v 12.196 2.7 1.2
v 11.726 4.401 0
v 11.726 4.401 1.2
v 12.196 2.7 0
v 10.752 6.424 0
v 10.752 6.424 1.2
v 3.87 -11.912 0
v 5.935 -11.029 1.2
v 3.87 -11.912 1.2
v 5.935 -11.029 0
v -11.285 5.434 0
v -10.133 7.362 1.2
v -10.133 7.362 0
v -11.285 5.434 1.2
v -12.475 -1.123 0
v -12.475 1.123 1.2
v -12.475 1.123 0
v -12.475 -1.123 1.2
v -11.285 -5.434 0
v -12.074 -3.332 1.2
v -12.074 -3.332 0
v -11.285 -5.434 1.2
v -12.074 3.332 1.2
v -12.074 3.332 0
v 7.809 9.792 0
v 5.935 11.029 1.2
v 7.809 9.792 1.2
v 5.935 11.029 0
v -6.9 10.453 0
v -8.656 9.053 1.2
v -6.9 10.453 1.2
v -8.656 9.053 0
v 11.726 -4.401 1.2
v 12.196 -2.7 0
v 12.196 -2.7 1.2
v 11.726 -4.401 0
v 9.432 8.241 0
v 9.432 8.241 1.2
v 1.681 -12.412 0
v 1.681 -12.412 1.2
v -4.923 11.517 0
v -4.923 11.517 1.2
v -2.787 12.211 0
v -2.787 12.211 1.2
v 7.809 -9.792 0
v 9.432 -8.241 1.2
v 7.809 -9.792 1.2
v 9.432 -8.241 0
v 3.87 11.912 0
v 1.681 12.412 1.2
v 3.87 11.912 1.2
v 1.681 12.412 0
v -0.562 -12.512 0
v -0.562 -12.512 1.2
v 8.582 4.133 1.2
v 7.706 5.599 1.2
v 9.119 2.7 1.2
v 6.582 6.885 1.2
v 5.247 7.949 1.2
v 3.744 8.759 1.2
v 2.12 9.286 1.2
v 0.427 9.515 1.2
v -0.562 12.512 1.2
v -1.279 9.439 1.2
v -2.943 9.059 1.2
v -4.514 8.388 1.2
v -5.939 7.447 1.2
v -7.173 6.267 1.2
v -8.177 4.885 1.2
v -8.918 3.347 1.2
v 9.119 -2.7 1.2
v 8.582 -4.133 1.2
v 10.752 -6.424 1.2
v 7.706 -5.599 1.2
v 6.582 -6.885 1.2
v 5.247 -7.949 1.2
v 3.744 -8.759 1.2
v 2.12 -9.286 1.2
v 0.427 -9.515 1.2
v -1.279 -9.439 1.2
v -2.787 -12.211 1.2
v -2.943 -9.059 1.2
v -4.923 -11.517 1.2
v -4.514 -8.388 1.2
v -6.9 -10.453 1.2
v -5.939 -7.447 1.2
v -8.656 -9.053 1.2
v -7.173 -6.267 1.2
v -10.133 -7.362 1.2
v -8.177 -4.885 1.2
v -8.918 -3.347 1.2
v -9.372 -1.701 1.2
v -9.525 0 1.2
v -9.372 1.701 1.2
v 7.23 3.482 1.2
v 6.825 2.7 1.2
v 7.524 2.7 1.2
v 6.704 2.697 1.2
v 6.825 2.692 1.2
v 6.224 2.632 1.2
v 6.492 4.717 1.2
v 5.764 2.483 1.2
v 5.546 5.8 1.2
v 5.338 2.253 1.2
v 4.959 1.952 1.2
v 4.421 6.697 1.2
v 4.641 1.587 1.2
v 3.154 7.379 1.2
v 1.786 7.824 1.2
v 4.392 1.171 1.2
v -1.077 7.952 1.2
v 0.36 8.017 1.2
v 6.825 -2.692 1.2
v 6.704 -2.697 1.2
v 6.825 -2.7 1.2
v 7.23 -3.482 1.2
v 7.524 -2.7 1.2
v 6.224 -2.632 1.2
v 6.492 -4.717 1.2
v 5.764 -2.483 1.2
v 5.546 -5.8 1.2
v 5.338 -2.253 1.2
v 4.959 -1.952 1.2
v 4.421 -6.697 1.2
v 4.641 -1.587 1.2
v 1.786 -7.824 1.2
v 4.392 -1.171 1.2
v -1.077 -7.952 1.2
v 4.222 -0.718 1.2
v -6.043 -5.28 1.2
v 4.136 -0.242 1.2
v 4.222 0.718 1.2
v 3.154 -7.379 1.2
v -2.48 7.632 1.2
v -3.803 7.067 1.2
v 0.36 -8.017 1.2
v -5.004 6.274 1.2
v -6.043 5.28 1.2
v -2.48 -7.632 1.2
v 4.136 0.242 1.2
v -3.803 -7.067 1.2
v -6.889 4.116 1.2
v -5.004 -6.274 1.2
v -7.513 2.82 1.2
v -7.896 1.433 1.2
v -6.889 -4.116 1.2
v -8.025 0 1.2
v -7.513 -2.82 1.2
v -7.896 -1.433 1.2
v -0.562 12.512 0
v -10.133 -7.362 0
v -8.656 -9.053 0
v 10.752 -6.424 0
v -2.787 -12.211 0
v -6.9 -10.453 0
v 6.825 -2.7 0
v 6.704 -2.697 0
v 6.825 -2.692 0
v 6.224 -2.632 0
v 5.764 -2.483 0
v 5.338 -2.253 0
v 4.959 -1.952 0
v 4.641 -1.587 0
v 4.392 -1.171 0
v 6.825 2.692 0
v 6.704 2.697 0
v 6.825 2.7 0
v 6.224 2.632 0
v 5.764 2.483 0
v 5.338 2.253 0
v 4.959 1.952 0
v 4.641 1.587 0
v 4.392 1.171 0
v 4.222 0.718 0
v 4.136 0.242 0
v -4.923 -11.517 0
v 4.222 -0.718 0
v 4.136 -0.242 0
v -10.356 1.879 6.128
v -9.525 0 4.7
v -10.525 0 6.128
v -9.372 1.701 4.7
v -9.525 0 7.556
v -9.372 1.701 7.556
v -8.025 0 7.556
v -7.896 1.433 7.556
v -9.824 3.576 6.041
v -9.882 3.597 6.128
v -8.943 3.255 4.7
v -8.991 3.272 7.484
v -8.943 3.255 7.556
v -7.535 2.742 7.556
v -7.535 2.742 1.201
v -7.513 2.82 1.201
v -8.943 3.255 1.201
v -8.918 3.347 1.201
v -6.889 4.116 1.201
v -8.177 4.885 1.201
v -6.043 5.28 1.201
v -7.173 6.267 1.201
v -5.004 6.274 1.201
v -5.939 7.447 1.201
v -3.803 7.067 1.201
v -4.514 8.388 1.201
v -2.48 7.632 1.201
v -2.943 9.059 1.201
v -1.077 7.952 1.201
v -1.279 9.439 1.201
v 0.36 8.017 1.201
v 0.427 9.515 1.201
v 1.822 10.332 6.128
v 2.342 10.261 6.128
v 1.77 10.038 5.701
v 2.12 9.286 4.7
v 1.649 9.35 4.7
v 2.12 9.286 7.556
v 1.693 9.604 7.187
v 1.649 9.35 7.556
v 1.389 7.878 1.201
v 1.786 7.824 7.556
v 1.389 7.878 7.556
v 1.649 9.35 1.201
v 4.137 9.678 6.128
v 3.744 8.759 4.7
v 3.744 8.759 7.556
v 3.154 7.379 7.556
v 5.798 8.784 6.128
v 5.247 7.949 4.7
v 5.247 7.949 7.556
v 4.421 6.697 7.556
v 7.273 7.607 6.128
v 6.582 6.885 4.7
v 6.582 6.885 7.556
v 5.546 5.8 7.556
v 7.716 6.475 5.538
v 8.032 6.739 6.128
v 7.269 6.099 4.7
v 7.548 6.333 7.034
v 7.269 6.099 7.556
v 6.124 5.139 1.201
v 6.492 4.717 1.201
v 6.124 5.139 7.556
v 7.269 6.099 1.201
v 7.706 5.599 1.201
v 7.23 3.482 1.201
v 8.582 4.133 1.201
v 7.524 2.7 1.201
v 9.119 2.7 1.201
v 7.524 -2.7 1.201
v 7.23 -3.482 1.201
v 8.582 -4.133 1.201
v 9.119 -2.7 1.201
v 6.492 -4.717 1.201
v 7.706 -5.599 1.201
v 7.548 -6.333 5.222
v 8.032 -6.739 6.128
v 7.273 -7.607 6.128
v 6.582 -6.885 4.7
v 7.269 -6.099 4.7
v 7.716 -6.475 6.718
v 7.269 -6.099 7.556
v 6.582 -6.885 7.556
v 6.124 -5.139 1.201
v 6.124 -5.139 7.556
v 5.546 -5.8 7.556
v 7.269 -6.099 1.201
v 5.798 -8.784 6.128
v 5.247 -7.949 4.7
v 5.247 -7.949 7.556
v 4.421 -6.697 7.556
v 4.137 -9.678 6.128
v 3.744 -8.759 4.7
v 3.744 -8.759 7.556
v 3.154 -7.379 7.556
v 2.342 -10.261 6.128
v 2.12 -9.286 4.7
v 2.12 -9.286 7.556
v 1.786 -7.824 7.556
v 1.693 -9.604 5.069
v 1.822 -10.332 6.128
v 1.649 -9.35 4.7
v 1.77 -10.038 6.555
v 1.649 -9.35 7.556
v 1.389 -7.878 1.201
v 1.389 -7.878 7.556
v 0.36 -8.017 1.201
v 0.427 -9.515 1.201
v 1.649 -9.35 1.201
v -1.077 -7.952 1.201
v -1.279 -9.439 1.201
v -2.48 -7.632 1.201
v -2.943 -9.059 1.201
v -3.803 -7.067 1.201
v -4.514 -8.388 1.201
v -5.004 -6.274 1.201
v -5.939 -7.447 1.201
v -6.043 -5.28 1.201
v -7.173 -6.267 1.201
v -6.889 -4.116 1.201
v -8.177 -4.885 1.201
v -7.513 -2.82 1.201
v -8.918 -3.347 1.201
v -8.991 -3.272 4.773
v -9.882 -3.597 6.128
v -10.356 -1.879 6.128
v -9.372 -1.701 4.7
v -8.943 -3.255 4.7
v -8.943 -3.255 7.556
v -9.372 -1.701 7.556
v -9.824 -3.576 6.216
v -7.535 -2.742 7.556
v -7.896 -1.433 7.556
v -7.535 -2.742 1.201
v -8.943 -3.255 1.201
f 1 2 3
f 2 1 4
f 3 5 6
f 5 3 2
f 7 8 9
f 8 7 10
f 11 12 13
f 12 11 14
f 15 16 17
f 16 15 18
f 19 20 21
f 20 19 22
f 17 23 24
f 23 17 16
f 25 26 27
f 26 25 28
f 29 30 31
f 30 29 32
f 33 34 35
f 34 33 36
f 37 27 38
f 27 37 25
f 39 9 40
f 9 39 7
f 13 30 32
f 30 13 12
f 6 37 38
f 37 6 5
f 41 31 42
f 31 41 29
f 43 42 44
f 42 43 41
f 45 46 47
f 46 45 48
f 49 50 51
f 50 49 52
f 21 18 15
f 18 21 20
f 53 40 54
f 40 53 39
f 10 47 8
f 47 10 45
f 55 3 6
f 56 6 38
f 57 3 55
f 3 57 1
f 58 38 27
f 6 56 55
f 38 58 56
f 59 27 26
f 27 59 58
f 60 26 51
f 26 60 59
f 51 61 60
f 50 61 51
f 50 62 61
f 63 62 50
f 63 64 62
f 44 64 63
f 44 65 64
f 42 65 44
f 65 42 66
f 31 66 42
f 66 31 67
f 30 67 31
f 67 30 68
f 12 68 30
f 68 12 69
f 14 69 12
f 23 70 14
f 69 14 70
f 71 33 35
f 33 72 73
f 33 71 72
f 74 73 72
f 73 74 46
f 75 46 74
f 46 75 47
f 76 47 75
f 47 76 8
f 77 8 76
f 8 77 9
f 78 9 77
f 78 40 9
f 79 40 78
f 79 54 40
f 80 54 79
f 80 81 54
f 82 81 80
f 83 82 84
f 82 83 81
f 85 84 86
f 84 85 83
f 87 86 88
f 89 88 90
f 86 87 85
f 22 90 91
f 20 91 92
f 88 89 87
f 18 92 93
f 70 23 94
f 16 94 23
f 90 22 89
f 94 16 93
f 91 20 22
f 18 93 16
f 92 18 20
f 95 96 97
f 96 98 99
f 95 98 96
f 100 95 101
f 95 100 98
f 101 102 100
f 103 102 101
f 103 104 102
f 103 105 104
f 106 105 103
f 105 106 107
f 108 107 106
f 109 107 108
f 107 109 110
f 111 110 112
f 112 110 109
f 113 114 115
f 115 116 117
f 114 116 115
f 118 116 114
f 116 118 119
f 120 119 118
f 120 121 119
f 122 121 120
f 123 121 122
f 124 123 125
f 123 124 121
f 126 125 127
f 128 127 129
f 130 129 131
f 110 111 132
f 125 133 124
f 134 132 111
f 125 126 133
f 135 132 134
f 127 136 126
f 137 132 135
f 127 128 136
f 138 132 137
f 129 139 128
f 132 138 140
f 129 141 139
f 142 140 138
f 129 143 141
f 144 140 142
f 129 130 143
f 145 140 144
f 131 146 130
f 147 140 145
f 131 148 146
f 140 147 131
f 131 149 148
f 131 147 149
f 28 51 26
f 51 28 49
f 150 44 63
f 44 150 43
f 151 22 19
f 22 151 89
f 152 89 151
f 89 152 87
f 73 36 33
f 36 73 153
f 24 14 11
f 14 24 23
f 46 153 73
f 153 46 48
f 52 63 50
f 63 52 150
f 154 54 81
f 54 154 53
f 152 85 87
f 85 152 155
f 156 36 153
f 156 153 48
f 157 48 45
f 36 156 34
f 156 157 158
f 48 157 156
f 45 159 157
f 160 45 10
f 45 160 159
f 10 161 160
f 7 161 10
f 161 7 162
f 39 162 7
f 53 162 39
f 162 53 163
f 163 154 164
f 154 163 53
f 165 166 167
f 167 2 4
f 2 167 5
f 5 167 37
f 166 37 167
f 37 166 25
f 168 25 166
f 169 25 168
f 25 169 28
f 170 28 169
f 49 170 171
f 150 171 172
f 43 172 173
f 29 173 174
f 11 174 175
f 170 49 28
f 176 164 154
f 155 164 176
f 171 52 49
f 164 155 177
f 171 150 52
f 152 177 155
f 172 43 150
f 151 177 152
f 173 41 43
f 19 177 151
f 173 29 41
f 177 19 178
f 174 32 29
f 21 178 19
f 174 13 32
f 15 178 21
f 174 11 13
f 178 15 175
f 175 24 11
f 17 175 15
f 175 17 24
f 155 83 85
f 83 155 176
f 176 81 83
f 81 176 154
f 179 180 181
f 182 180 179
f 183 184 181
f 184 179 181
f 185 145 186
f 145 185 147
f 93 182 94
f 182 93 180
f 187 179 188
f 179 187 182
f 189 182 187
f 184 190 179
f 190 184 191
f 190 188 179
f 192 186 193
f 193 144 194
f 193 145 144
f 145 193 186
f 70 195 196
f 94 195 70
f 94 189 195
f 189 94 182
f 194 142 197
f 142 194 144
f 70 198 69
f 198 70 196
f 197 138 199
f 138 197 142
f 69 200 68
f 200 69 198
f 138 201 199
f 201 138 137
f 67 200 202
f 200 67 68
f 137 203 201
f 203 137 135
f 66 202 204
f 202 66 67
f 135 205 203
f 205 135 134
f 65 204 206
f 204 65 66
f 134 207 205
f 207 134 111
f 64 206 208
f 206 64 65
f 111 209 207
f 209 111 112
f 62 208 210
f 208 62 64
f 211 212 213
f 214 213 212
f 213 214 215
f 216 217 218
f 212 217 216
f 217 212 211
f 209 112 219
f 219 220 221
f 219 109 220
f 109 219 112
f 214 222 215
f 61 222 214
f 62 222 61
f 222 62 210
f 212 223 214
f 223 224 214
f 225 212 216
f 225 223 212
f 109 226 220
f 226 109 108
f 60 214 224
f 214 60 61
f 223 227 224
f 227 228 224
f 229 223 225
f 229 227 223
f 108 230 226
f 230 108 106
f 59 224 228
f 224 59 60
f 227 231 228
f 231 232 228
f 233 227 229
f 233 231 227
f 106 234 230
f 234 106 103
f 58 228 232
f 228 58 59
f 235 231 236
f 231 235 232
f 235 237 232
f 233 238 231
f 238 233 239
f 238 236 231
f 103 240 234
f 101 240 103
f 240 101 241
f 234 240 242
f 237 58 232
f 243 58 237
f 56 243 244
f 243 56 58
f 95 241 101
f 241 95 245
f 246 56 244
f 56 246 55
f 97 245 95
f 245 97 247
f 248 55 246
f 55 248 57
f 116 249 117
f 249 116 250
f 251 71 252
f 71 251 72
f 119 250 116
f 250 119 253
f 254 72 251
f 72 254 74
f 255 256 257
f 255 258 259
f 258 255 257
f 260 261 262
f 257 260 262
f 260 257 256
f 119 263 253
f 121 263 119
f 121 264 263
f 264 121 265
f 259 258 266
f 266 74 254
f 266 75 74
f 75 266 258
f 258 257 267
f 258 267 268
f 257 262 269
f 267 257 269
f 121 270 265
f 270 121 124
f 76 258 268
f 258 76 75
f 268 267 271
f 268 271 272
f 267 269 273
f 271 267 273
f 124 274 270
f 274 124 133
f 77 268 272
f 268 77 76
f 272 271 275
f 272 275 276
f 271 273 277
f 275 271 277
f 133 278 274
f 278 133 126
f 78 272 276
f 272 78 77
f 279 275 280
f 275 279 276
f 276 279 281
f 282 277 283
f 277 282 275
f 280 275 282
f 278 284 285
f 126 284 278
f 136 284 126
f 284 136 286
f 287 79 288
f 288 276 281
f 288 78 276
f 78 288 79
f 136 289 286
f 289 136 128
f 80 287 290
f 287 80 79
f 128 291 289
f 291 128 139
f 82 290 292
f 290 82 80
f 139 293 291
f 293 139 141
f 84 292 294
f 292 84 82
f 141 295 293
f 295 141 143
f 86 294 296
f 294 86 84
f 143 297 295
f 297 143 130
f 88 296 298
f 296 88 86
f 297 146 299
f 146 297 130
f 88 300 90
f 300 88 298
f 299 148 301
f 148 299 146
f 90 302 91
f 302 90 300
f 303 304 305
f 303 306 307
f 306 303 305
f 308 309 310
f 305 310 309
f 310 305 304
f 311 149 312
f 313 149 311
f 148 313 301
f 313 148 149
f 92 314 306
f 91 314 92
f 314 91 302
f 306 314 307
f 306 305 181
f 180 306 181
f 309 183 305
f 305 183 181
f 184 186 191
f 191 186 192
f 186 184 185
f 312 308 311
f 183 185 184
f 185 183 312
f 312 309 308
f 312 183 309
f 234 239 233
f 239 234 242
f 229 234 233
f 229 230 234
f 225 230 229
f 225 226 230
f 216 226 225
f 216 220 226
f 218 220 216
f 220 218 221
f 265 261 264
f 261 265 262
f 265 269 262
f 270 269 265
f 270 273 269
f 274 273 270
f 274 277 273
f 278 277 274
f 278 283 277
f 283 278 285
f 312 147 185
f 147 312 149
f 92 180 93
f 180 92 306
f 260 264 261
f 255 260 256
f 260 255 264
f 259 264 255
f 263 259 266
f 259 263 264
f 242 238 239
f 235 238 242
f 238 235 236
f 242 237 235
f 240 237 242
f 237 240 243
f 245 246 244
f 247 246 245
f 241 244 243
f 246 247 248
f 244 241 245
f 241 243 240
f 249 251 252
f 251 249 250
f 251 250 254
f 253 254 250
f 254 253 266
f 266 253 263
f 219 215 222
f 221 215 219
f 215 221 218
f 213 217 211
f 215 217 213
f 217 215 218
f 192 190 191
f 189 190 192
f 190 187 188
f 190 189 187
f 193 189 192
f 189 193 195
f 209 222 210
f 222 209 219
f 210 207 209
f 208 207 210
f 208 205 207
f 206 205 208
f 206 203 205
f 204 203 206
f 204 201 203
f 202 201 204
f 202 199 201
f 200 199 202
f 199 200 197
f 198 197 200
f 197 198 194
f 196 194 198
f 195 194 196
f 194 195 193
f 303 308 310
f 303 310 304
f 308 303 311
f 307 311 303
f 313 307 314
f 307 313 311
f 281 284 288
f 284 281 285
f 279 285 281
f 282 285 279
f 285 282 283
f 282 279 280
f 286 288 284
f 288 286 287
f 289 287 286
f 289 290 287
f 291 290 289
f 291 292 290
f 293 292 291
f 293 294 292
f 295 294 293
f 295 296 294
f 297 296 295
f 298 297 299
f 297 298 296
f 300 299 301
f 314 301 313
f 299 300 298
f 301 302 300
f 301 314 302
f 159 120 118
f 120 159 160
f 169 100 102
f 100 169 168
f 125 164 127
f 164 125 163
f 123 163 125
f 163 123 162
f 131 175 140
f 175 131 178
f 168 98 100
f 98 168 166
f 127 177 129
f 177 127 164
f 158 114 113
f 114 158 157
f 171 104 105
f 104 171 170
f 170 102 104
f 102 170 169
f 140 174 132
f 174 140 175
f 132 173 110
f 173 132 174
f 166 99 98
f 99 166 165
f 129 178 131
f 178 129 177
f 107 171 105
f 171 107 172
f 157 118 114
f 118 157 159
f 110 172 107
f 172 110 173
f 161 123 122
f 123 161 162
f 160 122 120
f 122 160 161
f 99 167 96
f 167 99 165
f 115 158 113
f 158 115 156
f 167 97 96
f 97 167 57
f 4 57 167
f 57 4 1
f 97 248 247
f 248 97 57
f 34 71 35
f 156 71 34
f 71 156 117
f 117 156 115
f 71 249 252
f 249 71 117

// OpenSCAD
/*
 * Cable Plug (Parametric), v0.42
 *
 * by Alex Franke (CodeCreations), Dec 2012
 * http://www.theFrankes.com
 * 
 * Licenced under Creative Commons Attribution - Non-Commercial - Share Alike 3.0 
 * 
 * DESCRIPTION: Covers a larger hole in an enclosure while still providing space for a 
 *   cable to fit. This is useful when you need to drill a larger hole in order to fit 
 *   the cable ends through the enclosure wall but want to limit the overall size of the 
 *   opening.  
 * 
 * INSTRUCTIONS:  Choose some values in the "User-defined values" section, render,
 *   and print. Change the numberOfCatches and sliceAngle together to control the size 
 *   of the catches. See the comments for more details. 
 * 
 * v0.42, Dec 20, 2012: Initial Release.
 * 
 * TODO: 
 *   * None at this time. 
 */

/////////////////////////////////////////////////////////////////////////////
// User-defined values... 
/////////////////////////////////////////////////////////////////////////////

caseHoleDiameter    = 19.05;     // Diameter of the hole to plug
cableHoleDiameter   = 5.4;       // Diameter of the cable(s) taht go through the plug

caseThickness       = 3.5;       // Thickness of the material being plugged
caseOverlap         = 3;         // Distance the plug will overlap the hole opening

thickness           = 1.2;       // Thickness of the flat round portion of the plug

catchPostThickness  = 1.5;       // Thickness of the plug posts that go through the hole
catchHeight         = 1;         // Height of the "catch" portion that holds the plug in place
catchAngle          = 55;        // Angle of the "catch" material that holes the plug in place 

numberOfCatches     = 3;         // Number of catches/posts
sliceAngle          = 80;        // The angle of the empty space between catches/posts

$fn                 = 35;        // General curve quality


/////////////////////////////////////////////////////////////////////////////
// The code...
/////////////////////////////////////////////////////////////////////////////

catchYOffset = catchHeight/tan(90-catchAngle); 
stemHeight = caseThickness+catchYOffset*2;

difference() {
	union () {
		cylinder(h=thickness, r=caseHoleDiameter/2+caseOverlap);
	
		translate([0,0,thickness]) 
		rotate_extrude(convexity=5) 
		translate([caseHoleDiameter/2,0,0]) 
		polygon( points=[	
			[-catchPostThickness,0],
			[-catchPostThickness,stemHeight],
			[0,stemHeight],
			[catchHeight,stemHeight-catchYOffset],
			[0,caseThickness],
			[0,0]
			] ); 
	}

	// Cable hole 
	translate([(caseHoleDiameter-cableHoleDiameter)/2,0,-0.5]) 
		cylinder(h=thickness+stemHeight+1, r=cableHoleDiameter/2);

	// Cable channel
	translate([(caseHoleDiameter-cableHoleDiameter)/2,-cableHoleDiameter/2,-0.5]) 
		cube([cableHoleDiameter/2+caseOverlap+1,cableHoleDiameter,thickness+stemHeight+1]);

	// Cut catch posts 
	translate([0,0,thickness+0.001]) 
	for( i=[0:numberOfCatches-1] )
		rotate([0,0,i*(360/numberOfCatches)]) 
			wedge(caseHoleDiameter/2+catchHeight+1,stemHeight+1, sliceAngle);
	
}

module wedge(length, height, angle) {

	x = length; 
	y = 2*x*tan(angle/2); 
	z = height;
	x2 = (y/2)/sin(angle/2);

	difference() {
		translate([0,-y/2,0]) 
			cube([x,y,z]);

		for(i=[-1,1])
			rotate([0,0,angle/2*i]) 
				translate([0,-y/2 +y/2*i,-0.5]) 
					cube([x2,y,z+1]);

	}
}
